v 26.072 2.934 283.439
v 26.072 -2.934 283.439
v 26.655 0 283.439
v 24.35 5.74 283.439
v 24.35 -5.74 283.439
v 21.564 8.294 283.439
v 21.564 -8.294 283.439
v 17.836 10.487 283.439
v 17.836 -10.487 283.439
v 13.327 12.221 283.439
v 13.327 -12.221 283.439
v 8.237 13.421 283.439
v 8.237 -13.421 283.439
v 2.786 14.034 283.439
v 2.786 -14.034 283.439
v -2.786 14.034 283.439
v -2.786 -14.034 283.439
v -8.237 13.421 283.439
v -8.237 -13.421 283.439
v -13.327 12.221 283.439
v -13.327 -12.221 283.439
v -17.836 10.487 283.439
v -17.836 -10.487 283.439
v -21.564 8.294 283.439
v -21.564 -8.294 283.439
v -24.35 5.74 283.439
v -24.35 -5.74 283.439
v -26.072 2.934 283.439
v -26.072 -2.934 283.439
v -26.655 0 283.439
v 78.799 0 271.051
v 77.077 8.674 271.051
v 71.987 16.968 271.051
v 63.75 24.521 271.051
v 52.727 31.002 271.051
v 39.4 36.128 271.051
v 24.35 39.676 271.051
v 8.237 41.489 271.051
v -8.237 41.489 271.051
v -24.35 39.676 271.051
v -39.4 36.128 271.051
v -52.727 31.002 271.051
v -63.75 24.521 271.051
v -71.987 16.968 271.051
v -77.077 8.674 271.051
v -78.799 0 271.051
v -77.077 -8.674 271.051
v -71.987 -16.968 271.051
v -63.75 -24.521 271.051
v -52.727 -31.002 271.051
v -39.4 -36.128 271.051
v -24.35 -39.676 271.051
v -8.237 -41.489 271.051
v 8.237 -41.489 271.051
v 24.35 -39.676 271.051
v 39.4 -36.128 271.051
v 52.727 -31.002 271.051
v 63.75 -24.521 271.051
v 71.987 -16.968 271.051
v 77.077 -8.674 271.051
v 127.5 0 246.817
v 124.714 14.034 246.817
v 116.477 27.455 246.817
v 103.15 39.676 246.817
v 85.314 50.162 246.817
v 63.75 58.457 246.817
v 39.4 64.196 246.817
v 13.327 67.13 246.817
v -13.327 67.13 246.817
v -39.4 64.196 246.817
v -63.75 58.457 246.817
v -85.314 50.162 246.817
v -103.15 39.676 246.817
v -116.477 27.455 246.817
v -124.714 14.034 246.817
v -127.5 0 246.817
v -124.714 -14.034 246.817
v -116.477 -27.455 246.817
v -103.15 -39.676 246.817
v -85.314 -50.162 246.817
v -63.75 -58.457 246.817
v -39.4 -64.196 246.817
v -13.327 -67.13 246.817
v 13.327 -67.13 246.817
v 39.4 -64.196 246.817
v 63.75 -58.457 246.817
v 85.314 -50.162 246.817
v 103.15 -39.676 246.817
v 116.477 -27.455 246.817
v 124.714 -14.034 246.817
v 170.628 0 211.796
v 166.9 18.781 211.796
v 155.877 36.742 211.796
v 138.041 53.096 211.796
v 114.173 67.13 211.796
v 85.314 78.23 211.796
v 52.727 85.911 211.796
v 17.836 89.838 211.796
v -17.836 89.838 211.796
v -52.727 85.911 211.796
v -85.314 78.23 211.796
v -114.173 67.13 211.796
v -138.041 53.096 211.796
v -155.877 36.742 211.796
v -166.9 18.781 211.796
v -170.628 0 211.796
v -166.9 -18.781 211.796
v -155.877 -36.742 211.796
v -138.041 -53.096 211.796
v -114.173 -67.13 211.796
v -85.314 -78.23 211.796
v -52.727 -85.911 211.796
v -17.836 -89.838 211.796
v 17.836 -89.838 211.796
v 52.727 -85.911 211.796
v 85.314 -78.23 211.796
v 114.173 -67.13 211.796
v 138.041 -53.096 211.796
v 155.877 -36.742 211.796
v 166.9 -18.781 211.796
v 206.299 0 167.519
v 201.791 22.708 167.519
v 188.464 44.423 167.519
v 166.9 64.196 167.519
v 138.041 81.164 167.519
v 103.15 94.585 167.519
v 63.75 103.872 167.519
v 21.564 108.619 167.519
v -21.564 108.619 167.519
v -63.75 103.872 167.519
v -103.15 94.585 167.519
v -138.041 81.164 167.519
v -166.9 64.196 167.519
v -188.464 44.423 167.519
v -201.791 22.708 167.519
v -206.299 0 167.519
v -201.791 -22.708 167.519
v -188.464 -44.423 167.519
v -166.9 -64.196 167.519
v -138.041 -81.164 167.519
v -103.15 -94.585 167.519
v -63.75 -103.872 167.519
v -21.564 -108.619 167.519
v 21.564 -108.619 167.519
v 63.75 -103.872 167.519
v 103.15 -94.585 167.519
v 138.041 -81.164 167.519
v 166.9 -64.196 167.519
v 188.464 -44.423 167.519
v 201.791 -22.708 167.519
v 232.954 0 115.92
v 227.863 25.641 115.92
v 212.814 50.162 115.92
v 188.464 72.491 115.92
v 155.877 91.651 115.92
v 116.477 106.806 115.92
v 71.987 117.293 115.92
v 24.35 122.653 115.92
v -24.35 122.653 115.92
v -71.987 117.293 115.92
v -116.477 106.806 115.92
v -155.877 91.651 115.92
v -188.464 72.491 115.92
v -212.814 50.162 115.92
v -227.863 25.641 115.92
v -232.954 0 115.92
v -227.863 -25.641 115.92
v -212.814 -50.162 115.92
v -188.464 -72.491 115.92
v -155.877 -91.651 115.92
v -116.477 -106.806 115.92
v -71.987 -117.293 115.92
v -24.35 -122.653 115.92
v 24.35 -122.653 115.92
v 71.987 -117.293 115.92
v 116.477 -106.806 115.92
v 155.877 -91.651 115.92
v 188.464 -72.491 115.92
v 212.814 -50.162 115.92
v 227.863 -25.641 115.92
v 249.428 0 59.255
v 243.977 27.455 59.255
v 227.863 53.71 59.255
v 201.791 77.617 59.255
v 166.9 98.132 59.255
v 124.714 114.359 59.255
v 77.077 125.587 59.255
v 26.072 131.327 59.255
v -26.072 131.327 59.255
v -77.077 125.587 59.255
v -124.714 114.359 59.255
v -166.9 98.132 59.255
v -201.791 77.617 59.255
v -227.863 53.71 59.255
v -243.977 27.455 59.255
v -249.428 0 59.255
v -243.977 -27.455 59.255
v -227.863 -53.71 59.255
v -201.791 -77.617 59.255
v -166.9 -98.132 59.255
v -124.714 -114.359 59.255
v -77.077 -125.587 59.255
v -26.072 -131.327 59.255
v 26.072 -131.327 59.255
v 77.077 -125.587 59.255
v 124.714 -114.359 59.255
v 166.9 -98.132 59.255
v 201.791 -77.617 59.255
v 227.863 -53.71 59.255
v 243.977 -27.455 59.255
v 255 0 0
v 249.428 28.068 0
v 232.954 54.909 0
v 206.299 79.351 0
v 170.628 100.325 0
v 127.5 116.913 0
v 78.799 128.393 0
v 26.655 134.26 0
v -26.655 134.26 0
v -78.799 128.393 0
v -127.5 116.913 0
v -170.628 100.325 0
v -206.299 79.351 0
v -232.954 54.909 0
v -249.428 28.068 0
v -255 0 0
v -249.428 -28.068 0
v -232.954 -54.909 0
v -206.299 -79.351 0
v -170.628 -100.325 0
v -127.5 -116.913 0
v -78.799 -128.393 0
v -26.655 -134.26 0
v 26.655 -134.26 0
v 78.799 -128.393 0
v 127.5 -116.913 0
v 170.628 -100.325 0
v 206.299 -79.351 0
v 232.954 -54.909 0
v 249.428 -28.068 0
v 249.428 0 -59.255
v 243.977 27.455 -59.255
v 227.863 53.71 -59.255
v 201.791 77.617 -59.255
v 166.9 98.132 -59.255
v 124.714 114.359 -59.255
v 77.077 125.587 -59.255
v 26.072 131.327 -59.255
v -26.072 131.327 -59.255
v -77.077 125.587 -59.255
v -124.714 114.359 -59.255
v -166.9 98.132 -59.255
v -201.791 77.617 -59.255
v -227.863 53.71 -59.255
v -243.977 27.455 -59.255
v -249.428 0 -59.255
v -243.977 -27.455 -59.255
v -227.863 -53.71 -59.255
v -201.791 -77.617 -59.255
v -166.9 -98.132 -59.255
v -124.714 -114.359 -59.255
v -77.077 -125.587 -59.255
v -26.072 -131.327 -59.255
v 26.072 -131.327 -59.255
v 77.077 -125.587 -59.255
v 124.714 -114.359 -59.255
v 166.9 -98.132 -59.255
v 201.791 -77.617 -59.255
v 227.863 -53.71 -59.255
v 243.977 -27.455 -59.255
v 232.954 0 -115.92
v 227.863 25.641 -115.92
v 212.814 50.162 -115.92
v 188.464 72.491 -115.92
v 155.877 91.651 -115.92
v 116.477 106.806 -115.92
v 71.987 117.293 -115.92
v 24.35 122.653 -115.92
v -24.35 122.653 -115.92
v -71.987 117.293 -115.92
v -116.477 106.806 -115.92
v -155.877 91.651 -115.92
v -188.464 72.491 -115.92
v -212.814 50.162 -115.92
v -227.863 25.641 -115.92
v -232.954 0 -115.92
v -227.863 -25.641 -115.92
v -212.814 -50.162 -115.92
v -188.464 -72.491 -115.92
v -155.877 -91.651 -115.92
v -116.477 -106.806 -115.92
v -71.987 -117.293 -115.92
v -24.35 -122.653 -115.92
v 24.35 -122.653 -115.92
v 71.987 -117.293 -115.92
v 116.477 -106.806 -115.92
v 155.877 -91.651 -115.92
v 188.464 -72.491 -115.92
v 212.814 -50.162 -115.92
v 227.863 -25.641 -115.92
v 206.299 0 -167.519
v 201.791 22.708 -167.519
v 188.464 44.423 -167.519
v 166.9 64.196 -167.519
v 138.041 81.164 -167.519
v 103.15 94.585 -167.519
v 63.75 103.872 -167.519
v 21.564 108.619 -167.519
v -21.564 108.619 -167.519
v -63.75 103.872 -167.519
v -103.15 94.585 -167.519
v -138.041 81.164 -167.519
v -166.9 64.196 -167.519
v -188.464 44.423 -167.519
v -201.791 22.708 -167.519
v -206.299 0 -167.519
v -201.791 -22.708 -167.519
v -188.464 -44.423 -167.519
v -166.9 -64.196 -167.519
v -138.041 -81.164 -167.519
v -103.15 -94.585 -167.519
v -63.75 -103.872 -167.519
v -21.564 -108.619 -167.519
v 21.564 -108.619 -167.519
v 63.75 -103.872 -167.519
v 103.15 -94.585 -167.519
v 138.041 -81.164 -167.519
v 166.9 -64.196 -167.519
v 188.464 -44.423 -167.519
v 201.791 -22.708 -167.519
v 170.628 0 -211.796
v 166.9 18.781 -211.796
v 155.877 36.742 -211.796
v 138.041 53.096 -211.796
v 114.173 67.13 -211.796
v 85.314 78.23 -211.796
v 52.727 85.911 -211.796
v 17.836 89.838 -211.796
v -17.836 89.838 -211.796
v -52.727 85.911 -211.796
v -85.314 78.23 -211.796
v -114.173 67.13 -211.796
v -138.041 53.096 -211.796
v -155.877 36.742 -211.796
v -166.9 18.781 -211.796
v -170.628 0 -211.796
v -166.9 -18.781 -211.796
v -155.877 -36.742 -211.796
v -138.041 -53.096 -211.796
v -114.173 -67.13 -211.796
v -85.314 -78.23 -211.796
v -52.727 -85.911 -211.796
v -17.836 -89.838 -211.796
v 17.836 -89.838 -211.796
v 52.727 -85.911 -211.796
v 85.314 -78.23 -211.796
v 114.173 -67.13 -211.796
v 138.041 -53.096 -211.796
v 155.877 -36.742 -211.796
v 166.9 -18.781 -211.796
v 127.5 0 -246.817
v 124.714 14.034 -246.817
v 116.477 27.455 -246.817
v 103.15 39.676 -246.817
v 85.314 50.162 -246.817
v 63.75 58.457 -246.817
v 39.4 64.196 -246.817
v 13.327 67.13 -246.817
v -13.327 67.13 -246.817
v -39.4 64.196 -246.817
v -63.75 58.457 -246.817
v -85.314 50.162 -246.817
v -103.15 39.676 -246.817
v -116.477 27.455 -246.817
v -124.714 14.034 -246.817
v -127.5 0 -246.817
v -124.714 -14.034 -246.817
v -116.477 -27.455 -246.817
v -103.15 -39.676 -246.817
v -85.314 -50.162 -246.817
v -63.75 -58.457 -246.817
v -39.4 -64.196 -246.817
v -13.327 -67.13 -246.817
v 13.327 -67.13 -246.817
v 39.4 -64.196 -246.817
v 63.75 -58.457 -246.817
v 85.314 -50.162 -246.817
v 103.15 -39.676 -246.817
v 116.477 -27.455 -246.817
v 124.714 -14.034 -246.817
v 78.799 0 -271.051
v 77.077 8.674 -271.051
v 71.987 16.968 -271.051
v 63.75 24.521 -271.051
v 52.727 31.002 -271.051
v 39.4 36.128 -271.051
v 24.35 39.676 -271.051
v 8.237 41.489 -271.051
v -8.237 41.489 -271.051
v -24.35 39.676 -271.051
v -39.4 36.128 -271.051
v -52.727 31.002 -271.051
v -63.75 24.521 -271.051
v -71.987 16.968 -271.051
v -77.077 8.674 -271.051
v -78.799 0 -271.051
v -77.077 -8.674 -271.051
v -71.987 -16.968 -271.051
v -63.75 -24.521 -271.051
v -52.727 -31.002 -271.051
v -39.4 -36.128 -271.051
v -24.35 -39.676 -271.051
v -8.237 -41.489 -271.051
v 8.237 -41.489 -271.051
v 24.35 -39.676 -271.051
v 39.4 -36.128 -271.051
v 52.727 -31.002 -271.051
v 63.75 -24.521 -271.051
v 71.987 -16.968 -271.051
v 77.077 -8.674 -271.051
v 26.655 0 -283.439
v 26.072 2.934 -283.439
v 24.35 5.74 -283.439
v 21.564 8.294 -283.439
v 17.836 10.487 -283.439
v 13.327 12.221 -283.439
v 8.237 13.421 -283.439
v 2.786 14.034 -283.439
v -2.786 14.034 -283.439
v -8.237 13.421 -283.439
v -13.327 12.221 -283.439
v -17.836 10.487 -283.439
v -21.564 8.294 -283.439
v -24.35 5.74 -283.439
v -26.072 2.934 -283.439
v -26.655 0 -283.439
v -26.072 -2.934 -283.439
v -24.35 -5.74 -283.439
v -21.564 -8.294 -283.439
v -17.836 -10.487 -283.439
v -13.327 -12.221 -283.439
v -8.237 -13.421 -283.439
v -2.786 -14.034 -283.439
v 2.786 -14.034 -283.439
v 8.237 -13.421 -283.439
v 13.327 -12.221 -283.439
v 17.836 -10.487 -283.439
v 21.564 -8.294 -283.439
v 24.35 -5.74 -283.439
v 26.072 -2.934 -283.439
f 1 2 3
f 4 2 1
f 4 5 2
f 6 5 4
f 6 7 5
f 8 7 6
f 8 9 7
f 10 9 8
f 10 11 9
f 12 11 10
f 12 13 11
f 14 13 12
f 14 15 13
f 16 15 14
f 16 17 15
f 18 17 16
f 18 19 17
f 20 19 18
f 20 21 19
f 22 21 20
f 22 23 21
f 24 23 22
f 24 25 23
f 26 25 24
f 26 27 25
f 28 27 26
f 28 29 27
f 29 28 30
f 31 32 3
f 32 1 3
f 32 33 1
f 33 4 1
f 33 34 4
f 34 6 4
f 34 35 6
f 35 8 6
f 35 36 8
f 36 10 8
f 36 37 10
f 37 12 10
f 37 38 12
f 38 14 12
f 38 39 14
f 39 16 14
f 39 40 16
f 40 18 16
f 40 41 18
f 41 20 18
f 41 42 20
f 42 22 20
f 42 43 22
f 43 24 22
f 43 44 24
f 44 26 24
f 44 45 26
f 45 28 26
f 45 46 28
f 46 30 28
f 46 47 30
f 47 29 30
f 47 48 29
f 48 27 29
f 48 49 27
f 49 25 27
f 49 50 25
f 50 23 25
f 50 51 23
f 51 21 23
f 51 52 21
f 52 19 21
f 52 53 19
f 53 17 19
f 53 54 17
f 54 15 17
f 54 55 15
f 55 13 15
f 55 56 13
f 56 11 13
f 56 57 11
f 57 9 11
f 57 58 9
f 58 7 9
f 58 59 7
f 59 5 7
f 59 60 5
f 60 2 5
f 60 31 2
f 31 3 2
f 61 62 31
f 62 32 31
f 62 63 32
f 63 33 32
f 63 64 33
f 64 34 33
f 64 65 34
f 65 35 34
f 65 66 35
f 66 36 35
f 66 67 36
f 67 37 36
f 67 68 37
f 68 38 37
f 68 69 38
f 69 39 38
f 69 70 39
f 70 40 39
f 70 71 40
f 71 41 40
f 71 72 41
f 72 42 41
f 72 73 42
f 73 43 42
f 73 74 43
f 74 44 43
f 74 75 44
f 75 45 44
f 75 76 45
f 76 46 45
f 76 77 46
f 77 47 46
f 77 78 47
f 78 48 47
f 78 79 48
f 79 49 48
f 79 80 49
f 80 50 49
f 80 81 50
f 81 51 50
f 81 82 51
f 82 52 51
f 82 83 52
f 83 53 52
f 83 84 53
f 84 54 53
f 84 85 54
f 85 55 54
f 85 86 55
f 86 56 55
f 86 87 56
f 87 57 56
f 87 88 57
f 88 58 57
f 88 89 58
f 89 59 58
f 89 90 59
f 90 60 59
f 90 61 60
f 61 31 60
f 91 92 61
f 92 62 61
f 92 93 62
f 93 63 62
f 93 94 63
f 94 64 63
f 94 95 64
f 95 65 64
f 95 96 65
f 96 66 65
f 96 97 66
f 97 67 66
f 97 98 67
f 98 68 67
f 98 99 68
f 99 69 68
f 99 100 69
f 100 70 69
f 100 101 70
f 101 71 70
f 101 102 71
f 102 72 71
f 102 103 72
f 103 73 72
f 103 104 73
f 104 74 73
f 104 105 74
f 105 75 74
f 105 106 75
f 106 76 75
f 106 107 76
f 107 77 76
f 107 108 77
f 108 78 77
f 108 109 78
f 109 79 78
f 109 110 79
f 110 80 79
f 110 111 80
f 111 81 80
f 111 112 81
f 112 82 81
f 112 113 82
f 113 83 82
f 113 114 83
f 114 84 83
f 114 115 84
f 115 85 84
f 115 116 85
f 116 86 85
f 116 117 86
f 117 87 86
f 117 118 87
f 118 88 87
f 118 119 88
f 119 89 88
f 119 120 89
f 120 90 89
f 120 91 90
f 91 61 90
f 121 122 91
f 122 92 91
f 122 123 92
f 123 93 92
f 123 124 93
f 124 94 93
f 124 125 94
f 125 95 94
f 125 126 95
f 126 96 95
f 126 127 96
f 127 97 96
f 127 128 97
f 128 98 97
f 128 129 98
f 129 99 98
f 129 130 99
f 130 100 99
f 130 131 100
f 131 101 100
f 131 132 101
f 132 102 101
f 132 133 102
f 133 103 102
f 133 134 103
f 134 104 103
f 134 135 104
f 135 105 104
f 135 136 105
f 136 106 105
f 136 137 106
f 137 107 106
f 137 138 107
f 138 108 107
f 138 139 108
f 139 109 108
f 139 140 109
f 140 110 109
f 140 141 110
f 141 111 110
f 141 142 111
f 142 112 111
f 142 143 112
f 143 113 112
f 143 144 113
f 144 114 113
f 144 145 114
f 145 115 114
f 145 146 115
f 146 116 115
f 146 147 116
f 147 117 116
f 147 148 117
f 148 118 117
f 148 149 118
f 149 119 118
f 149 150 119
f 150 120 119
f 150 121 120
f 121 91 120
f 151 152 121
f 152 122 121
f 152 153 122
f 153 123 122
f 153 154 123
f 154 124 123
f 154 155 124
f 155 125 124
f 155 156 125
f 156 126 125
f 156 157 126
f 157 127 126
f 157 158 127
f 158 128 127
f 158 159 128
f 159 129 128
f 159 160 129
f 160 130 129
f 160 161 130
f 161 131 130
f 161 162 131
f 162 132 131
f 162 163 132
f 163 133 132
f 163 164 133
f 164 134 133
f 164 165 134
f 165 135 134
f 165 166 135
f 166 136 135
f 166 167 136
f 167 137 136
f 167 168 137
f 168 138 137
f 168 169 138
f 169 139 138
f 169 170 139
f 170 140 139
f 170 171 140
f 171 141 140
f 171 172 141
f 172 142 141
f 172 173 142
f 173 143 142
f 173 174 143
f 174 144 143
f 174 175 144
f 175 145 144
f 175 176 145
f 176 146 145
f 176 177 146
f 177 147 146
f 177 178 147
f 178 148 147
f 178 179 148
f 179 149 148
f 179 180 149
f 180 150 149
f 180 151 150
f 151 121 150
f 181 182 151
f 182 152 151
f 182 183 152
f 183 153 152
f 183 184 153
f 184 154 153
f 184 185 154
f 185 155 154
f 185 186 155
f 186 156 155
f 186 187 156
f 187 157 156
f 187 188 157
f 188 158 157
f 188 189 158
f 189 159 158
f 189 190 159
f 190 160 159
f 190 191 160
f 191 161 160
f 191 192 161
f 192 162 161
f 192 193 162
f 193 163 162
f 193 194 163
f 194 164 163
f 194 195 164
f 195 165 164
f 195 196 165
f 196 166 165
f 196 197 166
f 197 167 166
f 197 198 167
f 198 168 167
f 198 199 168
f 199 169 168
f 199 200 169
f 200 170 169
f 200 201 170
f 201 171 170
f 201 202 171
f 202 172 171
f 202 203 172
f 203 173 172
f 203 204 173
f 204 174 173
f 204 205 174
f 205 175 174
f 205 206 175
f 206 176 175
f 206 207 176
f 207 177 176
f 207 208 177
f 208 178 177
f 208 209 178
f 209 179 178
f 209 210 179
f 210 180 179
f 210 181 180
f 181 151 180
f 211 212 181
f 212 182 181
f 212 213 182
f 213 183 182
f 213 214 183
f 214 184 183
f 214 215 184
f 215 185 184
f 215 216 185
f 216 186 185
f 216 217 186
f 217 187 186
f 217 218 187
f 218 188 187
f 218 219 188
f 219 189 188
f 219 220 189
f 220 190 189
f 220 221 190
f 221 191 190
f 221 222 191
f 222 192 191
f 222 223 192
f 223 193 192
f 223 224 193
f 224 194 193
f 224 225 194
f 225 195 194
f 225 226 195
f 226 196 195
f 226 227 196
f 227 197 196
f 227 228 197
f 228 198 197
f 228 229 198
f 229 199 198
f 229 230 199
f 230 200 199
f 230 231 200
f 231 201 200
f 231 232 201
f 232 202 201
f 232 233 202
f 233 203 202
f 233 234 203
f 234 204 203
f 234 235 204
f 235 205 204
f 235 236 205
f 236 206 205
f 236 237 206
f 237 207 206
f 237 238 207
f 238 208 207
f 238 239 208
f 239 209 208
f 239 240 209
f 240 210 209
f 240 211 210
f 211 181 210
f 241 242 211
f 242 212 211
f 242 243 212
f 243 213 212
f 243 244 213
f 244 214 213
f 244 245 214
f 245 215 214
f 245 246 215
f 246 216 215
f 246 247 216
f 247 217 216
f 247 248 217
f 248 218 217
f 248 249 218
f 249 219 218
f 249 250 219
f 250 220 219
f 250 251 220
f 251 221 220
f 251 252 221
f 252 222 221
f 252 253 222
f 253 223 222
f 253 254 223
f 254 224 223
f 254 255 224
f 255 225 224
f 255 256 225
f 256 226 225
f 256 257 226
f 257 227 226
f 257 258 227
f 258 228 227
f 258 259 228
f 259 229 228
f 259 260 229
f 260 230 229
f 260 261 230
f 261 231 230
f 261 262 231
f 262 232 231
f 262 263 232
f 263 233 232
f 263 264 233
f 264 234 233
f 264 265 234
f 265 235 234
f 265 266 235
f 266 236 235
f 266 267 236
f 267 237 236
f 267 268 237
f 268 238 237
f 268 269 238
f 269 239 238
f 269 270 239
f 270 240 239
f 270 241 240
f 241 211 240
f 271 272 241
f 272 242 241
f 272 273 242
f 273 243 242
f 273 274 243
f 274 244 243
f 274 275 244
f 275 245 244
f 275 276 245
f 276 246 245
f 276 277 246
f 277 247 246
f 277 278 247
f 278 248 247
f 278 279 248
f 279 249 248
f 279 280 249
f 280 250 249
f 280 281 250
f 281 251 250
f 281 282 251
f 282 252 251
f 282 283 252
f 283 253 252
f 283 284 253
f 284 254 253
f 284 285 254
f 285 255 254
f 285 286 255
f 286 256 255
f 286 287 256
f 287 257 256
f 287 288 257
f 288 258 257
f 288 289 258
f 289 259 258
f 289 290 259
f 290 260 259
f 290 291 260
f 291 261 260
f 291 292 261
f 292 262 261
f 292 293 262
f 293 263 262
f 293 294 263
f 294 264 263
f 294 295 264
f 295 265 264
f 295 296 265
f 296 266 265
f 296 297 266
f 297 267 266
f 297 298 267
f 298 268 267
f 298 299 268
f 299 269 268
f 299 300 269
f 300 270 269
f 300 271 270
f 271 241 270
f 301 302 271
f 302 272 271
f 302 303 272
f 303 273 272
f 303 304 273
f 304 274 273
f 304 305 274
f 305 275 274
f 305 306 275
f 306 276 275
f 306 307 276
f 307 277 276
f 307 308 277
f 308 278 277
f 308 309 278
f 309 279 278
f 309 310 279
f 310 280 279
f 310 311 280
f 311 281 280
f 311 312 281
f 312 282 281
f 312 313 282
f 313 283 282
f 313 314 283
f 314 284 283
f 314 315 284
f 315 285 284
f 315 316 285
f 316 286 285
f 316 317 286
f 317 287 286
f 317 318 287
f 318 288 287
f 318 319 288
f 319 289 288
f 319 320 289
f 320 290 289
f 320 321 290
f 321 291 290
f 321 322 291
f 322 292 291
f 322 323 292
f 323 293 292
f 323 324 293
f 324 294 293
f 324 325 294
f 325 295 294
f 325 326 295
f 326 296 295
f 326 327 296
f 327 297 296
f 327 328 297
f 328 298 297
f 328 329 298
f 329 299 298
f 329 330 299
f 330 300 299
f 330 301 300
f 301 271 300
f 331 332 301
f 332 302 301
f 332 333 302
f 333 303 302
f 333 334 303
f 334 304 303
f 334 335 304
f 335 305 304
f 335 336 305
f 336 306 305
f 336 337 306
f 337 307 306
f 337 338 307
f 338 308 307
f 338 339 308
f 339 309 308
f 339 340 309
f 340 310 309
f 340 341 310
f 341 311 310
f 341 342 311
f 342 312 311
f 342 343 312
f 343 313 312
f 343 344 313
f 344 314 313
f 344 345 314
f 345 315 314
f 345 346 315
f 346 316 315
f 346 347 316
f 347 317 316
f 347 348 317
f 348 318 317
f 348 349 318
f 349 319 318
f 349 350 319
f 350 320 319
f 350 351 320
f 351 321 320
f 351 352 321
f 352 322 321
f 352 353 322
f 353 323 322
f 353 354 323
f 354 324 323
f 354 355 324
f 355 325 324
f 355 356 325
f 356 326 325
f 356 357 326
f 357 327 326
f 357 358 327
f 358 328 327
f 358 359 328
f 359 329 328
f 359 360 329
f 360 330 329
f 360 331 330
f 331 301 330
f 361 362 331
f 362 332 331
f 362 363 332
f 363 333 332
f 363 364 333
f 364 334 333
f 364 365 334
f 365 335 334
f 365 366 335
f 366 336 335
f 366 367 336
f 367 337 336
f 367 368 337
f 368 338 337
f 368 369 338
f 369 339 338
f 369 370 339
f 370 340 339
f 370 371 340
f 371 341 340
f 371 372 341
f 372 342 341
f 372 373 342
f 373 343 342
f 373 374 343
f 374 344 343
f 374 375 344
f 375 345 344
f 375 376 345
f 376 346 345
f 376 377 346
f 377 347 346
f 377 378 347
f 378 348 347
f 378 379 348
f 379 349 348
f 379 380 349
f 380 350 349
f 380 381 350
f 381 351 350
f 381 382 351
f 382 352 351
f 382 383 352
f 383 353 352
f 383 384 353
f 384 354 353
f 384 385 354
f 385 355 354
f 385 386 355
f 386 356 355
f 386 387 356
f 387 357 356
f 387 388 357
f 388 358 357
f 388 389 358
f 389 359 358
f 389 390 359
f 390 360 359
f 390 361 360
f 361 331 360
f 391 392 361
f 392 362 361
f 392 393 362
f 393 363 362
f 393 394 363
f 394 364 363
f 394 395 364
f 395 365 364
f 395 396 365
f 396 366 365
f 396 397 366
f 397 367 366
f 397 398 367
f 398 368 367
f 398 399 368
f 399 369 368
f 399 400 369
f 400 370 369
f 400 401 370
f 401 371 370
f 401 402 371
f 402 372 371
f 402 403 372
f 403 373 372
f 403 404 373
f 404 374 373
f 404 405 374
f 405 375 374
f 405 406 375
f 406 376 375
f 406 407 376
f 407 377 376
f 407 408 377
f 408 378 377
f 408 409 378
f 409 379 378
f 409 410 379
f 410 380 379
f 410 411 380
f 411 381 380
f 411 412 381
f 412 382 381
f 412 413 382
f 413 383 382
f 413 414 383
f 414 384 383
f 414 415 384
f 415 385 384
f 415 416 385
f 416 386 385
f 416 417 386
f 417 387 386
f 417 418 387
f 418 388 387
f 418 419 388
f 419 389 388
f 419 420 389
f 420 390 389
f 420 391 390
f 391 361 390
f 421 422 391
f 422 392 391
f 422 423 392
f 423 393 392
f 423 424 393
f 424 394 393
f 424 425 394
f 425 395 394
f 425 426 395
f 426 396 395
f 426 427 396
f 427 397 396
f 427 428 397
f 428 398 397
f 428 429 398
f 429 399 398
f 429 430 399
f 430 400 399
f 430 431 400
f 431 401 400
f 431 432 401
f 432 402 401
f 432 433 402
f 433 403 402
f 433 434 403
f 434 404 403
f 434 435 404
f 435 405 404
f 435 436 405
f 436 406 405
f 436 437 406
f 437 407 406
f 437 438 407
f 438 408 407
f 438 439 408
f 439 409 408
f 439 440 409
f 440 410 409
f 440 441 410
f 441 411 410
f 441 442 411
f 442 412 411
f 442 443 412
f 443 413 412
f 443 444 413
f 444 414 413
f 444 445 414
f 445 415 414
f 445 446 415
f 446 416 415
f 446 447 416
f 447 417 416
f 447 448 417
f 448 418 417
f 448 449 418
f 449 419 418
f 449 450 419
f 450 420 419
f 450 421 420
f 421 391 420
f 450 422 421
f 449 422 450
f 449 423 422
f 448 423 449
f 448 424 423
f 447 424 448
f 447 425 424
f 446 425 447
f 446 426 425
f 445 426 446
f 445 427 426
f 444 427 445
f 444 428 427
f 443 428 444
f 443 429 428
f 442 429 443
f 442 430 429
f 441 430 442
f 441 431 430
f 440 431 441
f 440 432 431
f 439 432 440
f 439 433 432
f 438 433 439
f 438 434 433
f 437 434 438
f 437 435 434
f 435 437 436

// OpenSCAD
// Generated by SolidPython 1.0.1 on 2020-07-29 00:46:53


scale(v = [17, 9, 19]) {
	sphere(r = 15);
}
/***********************************************
*********      SolidPython code:      **********
************************************************
 
# import packages: SolidPython
from solid import *
from solid.utils import *
from itertools import chain, combinations, permutations


class Resize:

    def __init__(self, scad_file):
        self.scad_file = scad_file
        #self.scad_file = import_scad(scad_file)
        # cone/cylinder param:
        self.r1 = 0
        self.r2 = 0
        self.h = 0
        # rectangular prism param:
        self.w = 0
        self.l = 0
        # ellipse param:
        self.r = 0

    # import OpenScad code (file name corresponds to shape)


    # classify shape + parameters
    def assign(self, param1, param2, param3):
        if self.scad_file == 'cone.scad':
            self.r1 = param1
            self.r2 = param2
            self.h = param3
        elif self.scad_file == 'cylinder.scad':
            self.r1 = param1
            self.r2 = param2
            self.h = param3
        elif self.scad_file == 'rectangularPrism.scad':
            self.h = param1
            self.l = param2
            self.w = param3
        else:
            self.r = param1
            self.h = param2

    # resize parameters
    def iterate(self):
        x = range(3, 20, 2)
        i = 1
        if self.scad_file == 'cone.scad':
            tempList = list(permutations(x, 2))
            for temp in tempList:
                param1 = temp[0]
                param2 = temp[1]
                filepath = 'produced_scad_files/' + 'cone' + str(param1) + '_' + str(param2) + '_' + '.scad'
                scad_render_to_file(cylinder(h=param1, r1=param2, r2=0), filepath)

        elif self.scad_file == 'cylinder.scad':
            tempList = list(permutations(x, 3))
            for temp in tempList:
                param1 = temp[0]
                param2 = temp[1]
                filepath = 'produced_scad_files/' + 'cylinder' + str(param1) + '_' + str(param2) + '_' + '.scad'
                scad_render_to_file(cylinder(h=param1, r1=param2, r2=param2), filepath)

        elif self.scad_file == 'rectangularPrism.scad':
            tempList = list(permutations(x, 3))
            for temp in tempList:
                param1 = temp[0]
                param2 = temp[1]
                param3 = temp[2]
                filepath = 'produced_scad_files/' + 'rectangularPrism' + str(param1) + '_' + str(param2) + '_' + str(
                    param3) + '.scad'
                scad_render_to_file(cube(size=(param1, param2, param3)), filepath)

        elif self.scad_file == 'ellipse.scad':
            tempList = list(permutations(x, 4))
            for temp in tempList:
                param1 = temp[0]
                param2 = temp[1]
                param3 = temp[2]
                param4 = temp[3]
                filepath = 'produced_scad_files/' + 'ellipse' + str(param1) + '_' + str(param2) + '_' + str(param3) + '_' + str(param4) + '.scad'
                scad_render_to_file(scale([param1, param2, param3])(sphere(r=param4)), filepath)

    def render_to_scadfile(self):
        scad_render_to_file(scad, 'example.scad') 
 
************************************************/
